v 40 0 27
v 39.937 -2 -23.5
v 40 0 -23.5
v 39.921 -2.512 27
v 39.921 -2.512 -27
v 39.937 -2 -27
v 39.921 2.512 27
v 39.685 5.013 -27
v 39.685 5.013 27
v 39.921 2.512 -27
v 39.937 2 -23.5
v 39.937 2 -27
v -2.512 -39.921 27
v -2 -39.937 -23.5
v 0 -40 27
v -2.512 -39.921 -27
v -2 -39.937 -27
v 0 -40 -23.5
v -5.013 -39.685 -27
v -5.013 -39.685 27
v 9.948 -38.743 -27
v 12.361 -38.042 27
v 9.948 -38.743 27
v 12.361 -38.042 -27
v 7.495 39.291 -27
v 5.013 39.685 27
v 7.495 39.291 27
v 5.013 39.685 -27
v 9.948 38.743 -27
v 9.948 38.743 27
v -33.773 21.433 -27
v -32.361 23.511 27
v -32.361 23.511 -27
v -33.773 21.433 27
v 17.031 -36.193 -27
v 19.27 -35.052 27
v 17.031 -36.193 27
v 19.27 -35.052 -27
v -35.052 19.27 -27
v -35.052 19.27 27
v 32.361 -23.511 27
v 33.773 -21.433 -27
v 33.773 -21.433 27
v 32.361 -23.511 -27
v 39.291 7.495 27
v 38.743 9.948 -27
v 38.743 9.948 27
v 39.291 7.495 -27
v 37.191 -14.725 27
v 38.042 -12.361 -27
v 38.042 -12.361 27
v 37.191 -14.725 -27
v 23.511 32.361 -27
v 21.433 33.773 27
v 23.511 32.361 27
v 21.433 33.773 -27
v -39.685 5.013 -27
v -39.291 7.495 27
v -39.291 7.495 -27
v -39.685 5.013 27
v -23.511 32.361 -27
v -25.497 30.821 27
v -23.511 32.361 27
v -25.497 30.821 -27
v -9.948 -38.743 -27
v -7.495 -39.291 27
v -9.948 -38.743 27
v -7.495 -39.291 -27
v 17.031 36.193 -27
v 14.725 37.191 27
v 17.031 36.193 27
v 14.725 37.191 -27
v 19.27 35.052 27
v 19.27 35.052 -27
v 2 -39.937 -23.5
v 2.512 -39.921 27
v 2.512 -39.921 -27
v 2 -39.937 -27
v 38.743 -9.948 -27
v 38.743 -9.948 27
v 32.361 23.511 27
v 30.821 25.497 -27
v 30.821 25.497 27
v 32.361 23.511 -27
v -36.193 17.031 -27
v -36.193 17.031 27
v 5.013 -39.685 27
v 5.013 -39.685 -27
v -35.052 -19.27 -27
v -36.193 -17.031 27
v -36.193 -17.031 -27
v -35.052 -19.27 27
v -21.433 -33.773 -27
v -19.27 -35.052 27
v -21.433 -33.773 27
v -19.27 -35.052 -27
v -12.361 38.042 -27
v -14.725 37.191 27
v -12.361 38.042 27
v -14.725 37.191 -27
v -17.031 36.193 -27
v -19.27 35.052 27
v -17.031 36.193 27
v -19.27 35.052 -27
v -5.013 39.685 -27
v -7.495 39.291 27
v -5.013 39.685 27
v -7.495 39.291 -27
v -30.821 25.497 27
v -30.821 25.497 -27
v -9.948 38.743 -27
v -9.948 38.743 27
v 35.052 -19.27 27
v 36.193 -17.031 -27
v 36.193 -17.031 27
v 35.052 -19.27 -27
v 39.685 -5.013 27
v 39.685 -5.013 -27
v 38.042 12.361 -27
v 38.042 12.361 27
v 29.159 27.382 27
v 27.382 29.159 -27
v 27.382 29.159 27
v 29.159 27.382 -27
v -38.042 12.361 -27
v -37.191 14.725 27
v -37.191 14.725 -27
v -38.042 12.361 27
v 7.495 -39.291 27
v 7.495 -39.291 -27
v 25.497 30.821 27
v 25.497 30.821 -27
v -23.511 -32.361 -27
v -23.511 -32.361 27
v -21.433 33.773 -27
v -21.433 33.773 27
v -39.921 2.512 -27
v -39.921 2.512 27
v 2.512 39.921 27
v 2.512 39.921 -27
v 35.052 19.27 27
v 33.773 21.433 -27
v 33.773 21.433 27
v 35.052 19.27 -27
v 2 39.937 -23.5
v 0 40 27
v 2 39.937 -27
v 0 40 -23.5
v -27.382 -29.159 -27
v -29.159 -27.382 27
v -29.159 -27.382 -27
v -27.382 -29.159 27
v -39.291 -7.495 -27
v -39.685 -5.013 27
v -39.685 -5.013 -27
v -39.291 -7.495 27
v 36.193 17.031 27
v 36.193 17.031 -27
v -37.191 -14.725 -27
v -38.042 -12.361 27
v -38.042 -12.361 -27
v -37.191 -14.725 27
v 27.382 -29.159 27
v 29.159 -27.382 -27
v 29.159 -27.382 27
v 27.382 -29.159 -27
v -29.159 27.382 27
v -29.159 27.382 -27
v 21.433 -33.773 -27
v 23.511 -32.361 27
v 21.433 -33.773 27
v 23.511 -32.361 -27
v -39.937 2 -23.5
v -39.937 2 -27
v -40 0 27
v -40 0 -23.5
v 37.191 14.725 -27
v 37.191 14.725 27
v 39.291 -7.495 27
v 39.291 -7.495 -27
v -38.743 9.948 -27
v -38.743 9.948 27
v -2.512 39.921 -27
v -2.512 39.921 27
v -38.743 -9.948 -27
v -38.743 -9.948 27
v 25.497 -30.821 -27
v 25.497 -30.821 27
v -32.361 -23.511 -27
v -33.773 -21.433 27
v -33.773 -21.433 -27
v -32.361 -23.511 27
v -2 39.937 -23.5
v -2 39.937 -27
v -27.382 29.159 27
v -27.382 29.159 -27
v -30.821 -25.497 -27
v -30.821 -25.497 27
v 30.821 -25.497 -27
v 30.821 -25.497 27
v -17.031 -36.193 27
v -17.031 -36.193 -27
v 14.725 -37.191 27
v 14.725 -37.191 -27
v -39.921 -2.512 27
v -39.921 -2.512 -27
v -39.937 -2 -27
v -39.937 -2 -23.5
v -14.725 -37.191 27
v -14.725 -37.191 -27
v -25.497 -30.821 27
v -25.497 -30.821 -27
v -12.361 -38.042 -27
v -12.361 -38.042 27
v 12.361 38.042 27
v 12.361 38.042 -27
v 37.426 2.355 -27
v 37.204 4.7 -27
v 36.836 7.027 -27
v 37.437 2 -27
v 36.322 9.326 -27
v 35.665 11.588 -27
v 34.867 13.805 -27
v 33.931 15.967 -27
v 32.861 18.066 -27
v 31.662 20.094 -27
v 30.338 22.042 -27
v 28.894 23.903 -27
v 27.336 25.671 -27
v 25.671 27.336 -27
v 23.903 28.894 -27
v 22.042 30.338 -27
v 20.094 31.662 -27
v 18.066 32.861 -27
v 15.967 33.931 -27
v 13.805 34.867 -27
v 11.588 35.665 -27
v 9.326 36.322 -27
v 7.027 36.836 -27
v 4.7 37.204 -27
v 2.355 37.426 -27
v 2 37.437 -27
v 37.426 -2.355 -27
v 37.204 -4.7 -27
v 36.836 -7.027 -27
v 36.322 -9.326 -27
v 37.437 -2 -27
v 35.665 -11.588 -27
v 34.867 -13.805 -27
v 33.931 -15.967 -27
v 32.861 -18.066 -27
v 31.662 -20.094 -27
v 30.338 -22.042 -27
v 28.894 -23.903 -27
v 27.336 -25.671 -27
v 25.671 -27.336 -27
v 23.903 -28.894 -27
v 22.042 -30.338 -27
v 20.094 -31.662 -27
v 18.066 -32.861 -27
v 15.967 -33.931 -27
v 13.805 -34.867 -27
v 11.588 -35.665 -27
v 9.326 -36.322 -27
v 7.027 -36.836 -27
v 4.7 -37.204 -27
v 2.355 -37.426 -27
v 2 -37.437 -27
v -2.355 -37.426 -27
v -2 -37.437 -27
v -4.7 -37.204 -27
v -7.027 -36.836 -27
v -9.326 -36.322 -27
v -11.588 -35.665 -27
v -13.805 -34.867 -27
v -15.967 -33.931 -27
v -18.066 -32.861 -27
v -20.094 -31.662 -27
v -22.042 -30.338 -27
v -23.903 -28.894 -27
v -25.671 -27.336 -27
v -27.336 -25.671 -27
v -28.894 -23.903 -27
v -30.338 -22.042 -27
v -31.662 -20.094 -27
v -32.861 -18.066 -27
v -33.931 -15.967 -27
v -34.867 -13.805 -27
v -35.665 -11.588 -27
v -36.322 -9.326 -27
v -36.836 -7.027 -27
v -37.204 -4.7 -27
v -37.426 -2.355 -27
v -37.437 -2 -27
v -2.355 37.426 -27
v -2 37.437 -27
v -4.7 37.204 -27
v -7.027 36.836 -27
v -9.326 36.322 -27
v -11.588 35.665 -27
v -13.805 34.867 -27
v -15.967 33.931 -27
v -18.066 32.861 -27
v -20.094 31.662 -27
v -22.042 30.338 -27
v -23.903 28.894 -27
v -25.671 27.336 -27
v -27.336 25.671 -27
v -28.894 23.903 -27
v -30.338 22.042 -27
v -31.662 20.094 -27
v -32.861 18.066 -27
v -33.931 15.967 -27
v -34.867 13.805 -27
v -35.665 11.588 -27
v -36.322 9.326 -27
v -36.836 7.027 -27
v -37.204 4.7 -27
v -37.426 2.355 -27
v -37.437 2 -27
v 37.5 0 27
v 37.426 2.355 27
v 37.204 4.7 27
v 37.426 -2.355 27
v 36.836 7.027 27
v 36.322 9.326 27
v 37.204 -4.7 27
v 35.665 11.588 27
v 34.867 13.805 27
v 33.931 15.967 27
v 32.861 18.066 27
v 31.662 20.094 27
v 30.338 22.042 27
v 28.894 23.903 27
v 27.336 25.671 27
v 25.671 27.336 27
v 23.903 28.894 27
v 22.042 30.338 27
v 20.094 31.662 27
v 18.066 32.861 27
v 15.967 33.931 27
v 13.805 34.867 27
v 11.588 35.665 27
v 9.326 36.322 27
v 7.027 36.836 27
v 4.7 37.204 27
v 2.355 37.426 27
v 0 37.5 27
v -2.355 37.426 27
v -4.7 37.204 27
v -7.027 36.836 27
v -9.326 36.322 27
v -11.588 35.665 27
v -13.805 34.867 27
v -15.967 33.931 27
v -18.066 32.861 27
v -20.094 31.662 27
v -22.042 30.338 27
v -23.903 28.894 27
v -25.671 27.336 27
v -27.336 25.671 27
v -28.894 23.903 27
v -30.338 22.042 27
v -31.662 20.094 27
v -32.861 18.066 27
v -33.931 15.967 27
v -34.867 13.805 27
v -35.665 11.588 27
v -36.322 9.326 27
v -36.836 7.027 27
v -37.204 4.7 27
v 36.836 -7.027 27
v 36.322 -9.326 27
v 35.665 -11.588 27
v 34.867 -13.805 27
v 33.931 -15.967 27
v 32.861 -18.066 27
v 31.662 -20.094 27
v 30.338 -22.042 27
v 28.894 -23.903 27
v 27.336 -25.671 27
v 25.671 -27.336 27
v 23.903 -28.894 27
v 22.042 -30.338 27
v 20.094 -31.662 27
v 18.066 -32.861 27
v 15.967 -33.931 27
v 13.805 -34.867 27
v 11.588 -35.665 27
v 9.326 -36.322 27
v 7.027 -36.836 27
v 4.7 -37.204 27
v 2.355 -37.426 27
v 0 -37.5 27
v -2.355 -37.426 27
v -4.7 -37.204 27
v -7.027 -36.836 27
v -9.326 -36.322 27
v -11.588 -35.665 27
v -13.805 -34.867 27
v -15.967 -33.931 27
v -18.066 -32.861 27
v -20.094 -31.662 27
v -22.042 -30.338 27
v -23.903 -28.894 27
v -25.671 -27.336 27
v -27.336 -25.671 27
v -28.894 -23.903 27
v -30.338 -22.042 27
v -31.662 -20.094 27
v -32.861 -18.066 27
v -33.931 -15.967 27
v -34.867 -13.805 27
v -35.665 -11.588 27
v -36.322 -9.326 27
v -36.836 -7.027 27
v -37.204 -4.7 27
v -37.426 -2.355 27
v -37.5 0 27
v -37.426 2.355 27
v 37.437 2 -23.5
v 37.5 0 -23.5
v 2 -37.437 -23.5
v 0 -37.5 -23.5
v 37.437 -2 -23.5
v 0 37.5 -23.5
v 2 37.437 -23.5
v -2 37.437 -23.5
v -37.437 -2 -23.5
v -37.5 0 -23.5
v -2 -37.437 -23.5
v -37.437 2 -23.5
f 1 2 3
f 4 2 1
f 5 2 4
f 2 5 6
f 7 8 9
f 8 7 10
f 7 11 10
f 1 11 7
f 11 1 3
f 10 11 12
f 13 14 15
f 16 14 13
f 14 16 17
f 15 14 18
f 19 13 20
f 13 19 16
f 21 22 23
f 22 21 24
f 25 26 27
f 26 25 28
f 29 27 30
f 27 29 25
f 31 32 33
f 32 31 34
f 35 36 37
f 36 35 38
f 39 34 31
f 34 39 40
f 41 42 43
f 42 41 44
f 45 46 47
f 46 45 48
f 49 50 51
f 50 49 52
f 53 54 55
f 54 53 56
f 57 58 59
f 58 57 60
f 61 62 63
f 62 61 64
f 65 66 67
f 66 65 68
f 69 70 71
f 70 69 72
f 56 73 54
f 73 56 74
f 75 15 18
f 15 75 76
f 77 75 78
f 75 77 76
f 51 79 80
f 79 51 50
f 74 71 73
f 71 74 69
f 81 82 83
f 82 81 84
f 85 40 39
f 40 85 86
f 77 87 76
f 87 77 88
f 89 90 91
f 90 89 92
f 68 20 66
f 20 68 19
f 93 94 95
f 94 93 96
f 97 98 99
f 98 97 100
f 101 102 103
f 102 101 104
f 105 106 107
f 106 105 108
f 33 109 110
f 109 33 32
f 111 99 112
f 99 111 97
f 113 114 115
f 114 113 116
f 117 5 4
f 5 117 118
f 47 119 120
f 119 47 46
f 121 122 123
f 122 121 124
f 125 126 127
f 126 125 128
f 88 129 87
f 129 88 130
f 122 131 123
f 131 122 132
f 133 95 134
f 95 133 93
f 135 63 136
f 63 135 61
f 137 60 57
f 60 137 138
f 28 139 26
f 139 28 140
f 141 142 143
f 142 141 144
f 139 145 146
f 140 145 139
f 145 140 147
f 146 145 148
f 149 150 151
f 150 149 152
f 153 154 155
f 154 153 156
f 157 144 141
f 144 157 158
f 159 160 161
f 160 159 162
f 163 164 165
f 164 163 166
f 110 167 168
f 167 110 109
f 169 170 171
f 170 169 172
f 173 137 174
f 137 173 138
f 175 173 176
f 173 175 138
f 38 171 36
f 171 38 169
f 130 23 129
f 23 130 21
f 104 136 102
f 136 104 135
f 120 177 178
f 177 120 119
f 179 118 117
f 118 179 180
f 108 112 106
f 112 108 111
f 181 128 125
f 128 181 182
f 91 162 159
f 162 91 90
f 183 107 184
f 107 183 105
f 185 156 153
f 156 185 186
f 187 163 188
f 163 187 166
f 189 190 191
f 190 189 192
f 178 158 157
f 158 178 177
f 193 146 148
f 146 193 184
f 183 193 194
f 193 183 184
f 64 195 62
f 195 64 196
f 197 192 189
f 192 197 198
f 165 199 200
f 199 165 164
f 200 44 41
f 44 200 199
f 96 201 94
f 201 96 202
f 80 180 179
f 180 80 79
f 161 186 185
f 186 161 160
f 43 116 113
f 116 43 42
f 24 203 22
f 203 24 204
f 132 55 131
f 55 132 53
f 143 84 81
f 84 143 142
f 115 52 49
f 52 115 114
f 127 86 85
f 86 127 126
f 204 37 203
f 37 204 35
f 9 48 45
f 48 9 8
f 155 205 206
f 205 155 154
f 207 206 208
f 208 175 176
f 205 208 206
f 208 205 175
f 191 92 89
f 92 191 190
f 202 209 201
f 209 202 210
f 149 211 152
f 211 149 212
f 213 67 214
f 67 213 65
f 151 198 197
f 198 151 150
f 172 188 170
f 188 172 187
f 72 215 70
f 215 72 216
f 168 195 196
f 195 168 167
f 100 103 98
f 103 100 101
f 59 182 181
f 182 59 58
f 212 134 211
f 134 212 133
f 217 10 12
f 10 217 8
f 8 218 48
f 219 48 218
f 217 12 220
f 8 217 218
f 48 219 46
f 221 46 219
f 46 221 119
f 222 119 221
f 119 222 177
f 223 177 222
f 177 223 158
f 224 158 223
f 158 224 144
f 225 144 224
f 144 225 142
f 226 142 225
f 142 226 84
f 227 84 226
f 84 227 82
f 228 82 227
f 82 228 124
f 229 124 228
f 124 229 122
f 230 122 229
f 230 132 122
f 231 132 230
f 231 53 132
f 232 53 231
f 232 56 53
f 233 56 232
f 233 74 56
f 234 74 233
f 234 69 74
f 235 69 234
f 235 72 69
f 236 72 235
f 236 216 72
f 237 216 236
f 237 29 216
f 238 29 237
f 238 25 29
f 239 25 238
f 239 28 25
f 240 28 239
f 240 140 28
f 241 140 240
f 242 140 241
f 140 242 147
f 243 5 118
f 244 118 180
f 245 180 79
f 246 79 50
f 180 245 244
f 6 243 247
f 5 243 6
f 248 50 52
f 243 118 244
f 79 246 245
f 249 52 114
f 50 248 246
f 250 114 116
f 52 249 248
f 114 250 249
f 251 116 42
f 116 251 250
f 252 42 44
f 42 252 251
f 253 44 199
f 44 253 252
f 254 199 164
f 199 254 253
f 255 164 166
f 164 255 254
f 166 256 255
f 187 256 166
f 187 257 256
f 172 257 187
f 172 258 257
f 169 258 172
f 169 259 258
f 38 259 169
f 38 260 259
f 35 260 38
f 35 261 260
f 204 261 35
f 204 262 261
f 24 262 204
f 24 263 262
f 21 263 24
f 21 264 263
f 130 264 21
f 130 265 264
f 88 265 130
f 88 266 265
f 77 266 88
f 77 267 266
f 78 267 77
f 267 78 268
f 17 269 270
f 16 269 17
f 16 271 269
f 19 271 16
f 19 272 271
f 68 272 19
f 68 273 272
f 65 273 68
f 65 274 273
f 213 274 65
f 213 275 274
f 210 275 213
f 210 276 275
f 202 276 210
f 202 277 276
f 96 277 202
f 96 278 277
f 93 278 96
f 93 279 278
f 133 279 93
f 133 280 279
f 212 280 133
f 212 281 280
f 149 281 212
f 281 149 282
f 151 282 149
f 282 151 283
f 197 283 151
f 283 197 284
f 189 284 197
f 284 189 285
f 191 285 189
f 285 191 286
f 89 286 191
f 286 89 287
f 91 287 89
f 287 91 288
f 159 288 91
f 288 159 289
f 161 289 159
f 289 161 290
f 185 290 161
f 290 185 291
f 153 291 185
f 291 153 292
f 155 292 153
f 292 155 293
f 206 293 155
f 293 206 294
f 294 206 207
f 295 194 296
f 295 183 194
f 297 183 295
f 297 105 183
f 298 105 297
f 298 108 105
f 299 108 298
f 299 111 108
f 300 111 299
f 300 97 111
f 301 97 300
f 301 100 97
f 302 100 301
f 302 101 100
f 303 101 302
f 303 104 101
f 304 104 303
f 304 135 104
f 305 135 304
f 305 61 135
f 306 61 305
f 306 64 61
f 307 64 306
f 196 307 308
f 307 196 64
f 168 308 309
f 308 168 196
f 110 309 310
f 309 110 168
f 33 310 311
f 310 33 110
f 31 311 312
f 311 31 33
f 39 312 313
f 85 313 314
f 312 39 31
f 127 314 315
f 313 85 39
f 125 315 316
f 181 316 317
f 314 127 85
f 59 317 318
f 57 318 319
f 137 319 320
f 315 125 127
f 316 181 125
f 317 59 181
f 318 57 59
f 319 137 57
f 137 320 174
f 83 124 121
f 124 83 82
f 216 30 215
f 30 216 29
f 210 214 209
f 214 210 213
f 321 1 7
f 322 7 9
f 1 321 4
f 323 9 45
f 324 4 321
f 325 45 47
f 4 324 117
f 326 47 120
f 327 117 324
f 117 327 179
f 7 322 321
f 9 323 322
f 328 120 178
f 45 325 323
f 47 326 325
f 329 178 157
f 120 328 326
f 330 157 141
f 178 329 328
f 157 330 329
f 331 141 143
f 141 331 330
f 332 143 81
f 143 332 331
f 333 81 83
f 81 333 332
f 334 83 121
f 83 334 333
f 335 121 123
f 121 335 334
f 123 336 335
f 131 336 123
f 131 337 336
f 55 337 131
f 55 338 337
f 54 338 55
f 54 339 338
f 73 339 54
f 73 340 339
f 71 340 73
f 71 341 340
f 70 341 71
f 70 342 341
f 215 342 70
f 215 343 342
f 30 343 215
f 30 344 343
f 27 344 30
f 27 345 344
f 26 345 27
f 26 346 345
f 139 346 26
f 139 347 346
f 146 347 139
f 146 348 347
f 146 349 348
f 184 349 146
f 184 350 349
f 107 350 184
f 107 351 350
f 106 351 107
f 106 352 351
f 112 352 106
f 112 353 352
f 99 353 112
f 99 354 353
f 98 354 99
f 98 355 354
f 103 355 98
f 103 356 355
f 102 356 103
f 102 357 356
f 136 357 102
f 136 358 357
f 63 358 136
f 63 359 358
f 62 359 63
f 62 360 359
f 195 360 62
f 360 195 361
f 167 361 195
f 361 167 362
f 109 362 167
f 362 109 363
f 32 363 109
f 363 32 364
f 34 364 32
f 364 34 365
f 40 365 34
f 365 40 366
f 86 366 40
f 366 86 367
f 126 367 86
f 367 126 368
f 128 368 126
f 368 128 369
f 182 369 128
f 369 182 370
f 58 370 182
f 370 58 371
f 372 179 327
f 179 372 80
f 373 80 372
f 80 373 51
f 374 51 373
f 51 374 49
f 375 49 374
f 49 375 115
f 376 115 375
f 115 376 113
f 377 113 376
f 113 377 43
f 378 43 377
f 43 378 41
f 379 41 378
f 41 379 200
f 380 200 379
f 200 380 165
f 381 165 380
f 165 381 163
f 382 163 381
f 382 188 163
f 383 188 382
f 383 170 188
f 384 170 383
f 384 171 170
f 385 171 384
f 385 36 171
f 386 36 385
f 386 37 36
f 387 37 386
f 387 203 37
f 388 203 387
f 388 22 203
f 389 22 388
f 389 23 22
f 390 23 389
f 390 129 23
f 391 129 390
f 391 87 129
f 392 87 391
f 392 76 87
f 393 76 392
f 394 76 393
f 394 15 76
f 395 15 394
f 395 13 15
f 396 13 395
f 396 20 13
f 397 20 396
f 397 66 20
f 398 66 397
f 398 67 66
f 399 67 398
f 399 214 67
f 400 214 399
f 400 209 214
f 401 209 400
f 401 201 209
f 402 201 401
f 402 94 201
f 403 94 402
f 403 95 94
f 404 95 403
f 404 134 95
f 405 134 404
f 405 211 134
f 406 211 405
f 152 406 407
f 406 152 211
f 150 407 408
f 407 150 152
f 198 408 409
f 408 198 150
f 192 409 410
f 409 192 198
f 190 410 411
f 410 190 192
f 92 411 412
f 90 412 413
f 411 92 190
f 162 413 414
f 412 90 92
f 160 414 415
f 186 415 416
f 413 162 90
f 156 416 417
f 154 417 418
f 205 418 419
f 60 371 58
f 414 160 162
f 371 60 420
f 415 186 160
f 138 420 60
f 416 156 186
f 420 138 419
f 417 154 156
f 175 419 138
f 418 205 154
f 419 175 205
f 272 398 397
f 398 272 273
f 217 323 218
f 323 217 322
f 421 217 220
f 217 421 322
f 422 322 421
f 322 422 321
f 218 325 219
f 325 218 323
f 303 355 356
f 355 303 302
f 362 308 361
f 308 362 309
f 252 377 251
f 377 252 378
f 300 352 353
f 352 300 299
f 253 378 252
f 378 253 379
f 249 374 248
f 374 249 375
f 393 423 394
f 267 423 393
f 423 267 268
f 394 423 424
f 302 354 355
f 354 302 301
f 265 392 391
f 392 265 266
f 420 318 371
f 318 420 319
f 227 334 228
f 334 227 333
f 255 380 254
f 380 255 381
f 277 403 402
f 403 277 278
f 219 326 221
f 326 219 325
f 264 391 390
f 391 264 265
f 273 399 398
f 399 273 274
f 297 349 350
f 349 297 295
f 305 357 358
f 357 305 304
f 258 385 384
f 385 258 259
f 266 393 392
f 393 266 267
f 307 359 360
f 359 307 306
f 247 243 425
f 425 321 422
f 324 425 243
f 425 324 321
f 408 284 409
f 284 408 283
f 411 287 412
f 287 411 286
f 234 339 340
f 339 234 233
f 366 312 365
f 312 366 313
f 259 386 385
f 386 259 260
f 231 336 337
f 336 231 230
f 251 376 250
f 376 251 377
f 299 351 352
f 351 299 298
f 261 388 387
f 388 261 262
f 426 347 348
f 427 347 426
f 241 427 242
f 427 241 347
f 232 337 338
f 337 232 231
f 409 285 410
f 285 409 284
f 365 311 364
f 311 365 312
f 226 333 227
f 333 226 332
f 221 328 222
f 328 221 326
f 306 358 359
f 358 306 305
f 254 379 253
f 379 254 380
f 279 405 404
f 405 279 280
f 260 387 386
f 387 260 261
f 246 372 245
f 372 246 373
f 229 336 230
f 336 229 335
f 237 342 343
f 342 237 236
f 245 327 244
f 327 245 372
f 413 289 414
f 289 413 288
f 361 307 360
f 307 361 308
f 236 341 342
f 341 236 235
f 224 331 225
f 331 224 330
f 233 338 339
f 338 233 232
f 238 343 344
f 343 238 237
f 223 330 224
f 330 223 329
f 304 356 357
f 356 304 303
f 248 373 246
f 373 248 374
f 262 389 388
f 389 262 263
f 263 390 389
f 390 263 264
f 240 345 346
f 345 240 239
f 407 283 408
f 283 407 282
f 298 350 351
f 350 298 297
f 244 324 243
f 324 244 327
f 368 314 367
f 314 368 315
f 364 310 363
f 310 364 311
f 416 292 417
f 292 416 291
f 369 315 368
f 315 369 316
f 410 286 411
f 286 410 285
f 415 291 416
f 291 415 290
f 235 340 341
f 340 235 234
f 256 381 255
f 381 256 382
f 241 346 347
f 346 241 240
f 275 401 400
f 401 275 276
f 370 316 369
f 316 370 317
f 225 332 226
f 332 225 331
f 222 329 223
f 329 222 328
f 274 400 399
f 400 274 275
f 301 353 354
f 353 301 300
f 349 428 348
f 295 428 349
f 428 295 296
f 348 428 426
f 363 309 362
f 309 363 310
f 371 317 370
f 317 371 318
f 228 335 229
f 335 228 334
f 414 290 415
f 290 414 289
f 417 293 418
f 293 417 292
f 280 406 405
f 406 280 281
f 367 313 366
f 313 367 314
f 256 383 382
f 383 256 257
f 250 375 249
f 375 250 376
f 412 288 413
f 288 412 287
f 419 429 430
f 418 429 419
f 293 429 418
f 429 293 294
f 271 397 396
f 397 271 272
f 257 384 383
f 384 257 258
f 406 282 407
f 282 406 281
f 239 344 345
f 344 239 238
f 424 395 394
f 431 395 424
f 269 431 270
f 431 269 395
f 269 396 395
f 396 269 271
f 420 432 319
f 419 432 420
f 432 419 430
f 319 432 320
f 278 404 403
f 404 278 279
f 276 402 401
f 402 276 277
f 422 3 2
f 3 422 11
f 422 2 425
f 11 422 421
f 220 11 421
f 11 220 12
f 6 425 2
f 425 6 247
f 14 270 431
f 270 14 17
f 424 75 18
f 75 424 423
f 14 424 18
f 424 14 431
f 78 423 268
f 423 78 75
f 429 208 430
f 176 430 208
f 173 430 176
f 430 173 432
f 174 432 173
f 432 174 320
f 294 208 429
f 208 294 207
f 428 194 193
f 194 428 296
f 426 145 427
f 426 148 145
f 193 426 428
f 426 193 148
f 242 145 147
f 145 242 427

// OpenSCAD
radius_cylinder=40; 
radius_cylinder2=radius_cylinder+5; 

$fn=100; // nbr faces

radius_cylinder=40;
radius_center_hole = 16;

radius_path=25;
num_holes=8;
radius_holes=1.5;


difference() {

    

difference() {
	cylinder (h = 60-3-3, r=radius_cylinder, center = true);
	cylinder (h = 82, r=radius_cylinder-2.5, center = true);
    
}

translate([0,0,-28.5]){
$fn=100; // nbr faces
rotate([0, 180, 0]) {
union(){
    difference(){
        difference() {
            cylinder (h = 3, r=radius_cylinder, center = true);
            cylinder (h = 6, r=radius_center_hole, center = true);
        }
        union(){
        for (i=[1:num_holes])  {
            translate([radius_path*cos(i*(360/num_holes)+360/(num_holes*2)),radius_path*sin(i*(360/num_holes)+360/(num_holes*2)),0]){
            cylinder(r=radius_holes,h=10, center = true);}
        };
        translate([radius_path+6,0,0]) {cylinder(r=radius_holes,h=10, center = true);};
        }
    }
    difference(){
        union(){cylinder (h = 3, r = 7, center = true);
        cube([33,5,3], center = true);}
        cylinder(r=radius_holes,h=10, center = true);
    }

    for (i=[1:4])  {
    translate([(radius_cylinder-2)*cos(i*(360/4)+360/4),(radius_cylinder-2)*sin(i*(360/4)+360/4),-3]){
    cube([4,4,4], center = true);}
    };
}
}
}
}
